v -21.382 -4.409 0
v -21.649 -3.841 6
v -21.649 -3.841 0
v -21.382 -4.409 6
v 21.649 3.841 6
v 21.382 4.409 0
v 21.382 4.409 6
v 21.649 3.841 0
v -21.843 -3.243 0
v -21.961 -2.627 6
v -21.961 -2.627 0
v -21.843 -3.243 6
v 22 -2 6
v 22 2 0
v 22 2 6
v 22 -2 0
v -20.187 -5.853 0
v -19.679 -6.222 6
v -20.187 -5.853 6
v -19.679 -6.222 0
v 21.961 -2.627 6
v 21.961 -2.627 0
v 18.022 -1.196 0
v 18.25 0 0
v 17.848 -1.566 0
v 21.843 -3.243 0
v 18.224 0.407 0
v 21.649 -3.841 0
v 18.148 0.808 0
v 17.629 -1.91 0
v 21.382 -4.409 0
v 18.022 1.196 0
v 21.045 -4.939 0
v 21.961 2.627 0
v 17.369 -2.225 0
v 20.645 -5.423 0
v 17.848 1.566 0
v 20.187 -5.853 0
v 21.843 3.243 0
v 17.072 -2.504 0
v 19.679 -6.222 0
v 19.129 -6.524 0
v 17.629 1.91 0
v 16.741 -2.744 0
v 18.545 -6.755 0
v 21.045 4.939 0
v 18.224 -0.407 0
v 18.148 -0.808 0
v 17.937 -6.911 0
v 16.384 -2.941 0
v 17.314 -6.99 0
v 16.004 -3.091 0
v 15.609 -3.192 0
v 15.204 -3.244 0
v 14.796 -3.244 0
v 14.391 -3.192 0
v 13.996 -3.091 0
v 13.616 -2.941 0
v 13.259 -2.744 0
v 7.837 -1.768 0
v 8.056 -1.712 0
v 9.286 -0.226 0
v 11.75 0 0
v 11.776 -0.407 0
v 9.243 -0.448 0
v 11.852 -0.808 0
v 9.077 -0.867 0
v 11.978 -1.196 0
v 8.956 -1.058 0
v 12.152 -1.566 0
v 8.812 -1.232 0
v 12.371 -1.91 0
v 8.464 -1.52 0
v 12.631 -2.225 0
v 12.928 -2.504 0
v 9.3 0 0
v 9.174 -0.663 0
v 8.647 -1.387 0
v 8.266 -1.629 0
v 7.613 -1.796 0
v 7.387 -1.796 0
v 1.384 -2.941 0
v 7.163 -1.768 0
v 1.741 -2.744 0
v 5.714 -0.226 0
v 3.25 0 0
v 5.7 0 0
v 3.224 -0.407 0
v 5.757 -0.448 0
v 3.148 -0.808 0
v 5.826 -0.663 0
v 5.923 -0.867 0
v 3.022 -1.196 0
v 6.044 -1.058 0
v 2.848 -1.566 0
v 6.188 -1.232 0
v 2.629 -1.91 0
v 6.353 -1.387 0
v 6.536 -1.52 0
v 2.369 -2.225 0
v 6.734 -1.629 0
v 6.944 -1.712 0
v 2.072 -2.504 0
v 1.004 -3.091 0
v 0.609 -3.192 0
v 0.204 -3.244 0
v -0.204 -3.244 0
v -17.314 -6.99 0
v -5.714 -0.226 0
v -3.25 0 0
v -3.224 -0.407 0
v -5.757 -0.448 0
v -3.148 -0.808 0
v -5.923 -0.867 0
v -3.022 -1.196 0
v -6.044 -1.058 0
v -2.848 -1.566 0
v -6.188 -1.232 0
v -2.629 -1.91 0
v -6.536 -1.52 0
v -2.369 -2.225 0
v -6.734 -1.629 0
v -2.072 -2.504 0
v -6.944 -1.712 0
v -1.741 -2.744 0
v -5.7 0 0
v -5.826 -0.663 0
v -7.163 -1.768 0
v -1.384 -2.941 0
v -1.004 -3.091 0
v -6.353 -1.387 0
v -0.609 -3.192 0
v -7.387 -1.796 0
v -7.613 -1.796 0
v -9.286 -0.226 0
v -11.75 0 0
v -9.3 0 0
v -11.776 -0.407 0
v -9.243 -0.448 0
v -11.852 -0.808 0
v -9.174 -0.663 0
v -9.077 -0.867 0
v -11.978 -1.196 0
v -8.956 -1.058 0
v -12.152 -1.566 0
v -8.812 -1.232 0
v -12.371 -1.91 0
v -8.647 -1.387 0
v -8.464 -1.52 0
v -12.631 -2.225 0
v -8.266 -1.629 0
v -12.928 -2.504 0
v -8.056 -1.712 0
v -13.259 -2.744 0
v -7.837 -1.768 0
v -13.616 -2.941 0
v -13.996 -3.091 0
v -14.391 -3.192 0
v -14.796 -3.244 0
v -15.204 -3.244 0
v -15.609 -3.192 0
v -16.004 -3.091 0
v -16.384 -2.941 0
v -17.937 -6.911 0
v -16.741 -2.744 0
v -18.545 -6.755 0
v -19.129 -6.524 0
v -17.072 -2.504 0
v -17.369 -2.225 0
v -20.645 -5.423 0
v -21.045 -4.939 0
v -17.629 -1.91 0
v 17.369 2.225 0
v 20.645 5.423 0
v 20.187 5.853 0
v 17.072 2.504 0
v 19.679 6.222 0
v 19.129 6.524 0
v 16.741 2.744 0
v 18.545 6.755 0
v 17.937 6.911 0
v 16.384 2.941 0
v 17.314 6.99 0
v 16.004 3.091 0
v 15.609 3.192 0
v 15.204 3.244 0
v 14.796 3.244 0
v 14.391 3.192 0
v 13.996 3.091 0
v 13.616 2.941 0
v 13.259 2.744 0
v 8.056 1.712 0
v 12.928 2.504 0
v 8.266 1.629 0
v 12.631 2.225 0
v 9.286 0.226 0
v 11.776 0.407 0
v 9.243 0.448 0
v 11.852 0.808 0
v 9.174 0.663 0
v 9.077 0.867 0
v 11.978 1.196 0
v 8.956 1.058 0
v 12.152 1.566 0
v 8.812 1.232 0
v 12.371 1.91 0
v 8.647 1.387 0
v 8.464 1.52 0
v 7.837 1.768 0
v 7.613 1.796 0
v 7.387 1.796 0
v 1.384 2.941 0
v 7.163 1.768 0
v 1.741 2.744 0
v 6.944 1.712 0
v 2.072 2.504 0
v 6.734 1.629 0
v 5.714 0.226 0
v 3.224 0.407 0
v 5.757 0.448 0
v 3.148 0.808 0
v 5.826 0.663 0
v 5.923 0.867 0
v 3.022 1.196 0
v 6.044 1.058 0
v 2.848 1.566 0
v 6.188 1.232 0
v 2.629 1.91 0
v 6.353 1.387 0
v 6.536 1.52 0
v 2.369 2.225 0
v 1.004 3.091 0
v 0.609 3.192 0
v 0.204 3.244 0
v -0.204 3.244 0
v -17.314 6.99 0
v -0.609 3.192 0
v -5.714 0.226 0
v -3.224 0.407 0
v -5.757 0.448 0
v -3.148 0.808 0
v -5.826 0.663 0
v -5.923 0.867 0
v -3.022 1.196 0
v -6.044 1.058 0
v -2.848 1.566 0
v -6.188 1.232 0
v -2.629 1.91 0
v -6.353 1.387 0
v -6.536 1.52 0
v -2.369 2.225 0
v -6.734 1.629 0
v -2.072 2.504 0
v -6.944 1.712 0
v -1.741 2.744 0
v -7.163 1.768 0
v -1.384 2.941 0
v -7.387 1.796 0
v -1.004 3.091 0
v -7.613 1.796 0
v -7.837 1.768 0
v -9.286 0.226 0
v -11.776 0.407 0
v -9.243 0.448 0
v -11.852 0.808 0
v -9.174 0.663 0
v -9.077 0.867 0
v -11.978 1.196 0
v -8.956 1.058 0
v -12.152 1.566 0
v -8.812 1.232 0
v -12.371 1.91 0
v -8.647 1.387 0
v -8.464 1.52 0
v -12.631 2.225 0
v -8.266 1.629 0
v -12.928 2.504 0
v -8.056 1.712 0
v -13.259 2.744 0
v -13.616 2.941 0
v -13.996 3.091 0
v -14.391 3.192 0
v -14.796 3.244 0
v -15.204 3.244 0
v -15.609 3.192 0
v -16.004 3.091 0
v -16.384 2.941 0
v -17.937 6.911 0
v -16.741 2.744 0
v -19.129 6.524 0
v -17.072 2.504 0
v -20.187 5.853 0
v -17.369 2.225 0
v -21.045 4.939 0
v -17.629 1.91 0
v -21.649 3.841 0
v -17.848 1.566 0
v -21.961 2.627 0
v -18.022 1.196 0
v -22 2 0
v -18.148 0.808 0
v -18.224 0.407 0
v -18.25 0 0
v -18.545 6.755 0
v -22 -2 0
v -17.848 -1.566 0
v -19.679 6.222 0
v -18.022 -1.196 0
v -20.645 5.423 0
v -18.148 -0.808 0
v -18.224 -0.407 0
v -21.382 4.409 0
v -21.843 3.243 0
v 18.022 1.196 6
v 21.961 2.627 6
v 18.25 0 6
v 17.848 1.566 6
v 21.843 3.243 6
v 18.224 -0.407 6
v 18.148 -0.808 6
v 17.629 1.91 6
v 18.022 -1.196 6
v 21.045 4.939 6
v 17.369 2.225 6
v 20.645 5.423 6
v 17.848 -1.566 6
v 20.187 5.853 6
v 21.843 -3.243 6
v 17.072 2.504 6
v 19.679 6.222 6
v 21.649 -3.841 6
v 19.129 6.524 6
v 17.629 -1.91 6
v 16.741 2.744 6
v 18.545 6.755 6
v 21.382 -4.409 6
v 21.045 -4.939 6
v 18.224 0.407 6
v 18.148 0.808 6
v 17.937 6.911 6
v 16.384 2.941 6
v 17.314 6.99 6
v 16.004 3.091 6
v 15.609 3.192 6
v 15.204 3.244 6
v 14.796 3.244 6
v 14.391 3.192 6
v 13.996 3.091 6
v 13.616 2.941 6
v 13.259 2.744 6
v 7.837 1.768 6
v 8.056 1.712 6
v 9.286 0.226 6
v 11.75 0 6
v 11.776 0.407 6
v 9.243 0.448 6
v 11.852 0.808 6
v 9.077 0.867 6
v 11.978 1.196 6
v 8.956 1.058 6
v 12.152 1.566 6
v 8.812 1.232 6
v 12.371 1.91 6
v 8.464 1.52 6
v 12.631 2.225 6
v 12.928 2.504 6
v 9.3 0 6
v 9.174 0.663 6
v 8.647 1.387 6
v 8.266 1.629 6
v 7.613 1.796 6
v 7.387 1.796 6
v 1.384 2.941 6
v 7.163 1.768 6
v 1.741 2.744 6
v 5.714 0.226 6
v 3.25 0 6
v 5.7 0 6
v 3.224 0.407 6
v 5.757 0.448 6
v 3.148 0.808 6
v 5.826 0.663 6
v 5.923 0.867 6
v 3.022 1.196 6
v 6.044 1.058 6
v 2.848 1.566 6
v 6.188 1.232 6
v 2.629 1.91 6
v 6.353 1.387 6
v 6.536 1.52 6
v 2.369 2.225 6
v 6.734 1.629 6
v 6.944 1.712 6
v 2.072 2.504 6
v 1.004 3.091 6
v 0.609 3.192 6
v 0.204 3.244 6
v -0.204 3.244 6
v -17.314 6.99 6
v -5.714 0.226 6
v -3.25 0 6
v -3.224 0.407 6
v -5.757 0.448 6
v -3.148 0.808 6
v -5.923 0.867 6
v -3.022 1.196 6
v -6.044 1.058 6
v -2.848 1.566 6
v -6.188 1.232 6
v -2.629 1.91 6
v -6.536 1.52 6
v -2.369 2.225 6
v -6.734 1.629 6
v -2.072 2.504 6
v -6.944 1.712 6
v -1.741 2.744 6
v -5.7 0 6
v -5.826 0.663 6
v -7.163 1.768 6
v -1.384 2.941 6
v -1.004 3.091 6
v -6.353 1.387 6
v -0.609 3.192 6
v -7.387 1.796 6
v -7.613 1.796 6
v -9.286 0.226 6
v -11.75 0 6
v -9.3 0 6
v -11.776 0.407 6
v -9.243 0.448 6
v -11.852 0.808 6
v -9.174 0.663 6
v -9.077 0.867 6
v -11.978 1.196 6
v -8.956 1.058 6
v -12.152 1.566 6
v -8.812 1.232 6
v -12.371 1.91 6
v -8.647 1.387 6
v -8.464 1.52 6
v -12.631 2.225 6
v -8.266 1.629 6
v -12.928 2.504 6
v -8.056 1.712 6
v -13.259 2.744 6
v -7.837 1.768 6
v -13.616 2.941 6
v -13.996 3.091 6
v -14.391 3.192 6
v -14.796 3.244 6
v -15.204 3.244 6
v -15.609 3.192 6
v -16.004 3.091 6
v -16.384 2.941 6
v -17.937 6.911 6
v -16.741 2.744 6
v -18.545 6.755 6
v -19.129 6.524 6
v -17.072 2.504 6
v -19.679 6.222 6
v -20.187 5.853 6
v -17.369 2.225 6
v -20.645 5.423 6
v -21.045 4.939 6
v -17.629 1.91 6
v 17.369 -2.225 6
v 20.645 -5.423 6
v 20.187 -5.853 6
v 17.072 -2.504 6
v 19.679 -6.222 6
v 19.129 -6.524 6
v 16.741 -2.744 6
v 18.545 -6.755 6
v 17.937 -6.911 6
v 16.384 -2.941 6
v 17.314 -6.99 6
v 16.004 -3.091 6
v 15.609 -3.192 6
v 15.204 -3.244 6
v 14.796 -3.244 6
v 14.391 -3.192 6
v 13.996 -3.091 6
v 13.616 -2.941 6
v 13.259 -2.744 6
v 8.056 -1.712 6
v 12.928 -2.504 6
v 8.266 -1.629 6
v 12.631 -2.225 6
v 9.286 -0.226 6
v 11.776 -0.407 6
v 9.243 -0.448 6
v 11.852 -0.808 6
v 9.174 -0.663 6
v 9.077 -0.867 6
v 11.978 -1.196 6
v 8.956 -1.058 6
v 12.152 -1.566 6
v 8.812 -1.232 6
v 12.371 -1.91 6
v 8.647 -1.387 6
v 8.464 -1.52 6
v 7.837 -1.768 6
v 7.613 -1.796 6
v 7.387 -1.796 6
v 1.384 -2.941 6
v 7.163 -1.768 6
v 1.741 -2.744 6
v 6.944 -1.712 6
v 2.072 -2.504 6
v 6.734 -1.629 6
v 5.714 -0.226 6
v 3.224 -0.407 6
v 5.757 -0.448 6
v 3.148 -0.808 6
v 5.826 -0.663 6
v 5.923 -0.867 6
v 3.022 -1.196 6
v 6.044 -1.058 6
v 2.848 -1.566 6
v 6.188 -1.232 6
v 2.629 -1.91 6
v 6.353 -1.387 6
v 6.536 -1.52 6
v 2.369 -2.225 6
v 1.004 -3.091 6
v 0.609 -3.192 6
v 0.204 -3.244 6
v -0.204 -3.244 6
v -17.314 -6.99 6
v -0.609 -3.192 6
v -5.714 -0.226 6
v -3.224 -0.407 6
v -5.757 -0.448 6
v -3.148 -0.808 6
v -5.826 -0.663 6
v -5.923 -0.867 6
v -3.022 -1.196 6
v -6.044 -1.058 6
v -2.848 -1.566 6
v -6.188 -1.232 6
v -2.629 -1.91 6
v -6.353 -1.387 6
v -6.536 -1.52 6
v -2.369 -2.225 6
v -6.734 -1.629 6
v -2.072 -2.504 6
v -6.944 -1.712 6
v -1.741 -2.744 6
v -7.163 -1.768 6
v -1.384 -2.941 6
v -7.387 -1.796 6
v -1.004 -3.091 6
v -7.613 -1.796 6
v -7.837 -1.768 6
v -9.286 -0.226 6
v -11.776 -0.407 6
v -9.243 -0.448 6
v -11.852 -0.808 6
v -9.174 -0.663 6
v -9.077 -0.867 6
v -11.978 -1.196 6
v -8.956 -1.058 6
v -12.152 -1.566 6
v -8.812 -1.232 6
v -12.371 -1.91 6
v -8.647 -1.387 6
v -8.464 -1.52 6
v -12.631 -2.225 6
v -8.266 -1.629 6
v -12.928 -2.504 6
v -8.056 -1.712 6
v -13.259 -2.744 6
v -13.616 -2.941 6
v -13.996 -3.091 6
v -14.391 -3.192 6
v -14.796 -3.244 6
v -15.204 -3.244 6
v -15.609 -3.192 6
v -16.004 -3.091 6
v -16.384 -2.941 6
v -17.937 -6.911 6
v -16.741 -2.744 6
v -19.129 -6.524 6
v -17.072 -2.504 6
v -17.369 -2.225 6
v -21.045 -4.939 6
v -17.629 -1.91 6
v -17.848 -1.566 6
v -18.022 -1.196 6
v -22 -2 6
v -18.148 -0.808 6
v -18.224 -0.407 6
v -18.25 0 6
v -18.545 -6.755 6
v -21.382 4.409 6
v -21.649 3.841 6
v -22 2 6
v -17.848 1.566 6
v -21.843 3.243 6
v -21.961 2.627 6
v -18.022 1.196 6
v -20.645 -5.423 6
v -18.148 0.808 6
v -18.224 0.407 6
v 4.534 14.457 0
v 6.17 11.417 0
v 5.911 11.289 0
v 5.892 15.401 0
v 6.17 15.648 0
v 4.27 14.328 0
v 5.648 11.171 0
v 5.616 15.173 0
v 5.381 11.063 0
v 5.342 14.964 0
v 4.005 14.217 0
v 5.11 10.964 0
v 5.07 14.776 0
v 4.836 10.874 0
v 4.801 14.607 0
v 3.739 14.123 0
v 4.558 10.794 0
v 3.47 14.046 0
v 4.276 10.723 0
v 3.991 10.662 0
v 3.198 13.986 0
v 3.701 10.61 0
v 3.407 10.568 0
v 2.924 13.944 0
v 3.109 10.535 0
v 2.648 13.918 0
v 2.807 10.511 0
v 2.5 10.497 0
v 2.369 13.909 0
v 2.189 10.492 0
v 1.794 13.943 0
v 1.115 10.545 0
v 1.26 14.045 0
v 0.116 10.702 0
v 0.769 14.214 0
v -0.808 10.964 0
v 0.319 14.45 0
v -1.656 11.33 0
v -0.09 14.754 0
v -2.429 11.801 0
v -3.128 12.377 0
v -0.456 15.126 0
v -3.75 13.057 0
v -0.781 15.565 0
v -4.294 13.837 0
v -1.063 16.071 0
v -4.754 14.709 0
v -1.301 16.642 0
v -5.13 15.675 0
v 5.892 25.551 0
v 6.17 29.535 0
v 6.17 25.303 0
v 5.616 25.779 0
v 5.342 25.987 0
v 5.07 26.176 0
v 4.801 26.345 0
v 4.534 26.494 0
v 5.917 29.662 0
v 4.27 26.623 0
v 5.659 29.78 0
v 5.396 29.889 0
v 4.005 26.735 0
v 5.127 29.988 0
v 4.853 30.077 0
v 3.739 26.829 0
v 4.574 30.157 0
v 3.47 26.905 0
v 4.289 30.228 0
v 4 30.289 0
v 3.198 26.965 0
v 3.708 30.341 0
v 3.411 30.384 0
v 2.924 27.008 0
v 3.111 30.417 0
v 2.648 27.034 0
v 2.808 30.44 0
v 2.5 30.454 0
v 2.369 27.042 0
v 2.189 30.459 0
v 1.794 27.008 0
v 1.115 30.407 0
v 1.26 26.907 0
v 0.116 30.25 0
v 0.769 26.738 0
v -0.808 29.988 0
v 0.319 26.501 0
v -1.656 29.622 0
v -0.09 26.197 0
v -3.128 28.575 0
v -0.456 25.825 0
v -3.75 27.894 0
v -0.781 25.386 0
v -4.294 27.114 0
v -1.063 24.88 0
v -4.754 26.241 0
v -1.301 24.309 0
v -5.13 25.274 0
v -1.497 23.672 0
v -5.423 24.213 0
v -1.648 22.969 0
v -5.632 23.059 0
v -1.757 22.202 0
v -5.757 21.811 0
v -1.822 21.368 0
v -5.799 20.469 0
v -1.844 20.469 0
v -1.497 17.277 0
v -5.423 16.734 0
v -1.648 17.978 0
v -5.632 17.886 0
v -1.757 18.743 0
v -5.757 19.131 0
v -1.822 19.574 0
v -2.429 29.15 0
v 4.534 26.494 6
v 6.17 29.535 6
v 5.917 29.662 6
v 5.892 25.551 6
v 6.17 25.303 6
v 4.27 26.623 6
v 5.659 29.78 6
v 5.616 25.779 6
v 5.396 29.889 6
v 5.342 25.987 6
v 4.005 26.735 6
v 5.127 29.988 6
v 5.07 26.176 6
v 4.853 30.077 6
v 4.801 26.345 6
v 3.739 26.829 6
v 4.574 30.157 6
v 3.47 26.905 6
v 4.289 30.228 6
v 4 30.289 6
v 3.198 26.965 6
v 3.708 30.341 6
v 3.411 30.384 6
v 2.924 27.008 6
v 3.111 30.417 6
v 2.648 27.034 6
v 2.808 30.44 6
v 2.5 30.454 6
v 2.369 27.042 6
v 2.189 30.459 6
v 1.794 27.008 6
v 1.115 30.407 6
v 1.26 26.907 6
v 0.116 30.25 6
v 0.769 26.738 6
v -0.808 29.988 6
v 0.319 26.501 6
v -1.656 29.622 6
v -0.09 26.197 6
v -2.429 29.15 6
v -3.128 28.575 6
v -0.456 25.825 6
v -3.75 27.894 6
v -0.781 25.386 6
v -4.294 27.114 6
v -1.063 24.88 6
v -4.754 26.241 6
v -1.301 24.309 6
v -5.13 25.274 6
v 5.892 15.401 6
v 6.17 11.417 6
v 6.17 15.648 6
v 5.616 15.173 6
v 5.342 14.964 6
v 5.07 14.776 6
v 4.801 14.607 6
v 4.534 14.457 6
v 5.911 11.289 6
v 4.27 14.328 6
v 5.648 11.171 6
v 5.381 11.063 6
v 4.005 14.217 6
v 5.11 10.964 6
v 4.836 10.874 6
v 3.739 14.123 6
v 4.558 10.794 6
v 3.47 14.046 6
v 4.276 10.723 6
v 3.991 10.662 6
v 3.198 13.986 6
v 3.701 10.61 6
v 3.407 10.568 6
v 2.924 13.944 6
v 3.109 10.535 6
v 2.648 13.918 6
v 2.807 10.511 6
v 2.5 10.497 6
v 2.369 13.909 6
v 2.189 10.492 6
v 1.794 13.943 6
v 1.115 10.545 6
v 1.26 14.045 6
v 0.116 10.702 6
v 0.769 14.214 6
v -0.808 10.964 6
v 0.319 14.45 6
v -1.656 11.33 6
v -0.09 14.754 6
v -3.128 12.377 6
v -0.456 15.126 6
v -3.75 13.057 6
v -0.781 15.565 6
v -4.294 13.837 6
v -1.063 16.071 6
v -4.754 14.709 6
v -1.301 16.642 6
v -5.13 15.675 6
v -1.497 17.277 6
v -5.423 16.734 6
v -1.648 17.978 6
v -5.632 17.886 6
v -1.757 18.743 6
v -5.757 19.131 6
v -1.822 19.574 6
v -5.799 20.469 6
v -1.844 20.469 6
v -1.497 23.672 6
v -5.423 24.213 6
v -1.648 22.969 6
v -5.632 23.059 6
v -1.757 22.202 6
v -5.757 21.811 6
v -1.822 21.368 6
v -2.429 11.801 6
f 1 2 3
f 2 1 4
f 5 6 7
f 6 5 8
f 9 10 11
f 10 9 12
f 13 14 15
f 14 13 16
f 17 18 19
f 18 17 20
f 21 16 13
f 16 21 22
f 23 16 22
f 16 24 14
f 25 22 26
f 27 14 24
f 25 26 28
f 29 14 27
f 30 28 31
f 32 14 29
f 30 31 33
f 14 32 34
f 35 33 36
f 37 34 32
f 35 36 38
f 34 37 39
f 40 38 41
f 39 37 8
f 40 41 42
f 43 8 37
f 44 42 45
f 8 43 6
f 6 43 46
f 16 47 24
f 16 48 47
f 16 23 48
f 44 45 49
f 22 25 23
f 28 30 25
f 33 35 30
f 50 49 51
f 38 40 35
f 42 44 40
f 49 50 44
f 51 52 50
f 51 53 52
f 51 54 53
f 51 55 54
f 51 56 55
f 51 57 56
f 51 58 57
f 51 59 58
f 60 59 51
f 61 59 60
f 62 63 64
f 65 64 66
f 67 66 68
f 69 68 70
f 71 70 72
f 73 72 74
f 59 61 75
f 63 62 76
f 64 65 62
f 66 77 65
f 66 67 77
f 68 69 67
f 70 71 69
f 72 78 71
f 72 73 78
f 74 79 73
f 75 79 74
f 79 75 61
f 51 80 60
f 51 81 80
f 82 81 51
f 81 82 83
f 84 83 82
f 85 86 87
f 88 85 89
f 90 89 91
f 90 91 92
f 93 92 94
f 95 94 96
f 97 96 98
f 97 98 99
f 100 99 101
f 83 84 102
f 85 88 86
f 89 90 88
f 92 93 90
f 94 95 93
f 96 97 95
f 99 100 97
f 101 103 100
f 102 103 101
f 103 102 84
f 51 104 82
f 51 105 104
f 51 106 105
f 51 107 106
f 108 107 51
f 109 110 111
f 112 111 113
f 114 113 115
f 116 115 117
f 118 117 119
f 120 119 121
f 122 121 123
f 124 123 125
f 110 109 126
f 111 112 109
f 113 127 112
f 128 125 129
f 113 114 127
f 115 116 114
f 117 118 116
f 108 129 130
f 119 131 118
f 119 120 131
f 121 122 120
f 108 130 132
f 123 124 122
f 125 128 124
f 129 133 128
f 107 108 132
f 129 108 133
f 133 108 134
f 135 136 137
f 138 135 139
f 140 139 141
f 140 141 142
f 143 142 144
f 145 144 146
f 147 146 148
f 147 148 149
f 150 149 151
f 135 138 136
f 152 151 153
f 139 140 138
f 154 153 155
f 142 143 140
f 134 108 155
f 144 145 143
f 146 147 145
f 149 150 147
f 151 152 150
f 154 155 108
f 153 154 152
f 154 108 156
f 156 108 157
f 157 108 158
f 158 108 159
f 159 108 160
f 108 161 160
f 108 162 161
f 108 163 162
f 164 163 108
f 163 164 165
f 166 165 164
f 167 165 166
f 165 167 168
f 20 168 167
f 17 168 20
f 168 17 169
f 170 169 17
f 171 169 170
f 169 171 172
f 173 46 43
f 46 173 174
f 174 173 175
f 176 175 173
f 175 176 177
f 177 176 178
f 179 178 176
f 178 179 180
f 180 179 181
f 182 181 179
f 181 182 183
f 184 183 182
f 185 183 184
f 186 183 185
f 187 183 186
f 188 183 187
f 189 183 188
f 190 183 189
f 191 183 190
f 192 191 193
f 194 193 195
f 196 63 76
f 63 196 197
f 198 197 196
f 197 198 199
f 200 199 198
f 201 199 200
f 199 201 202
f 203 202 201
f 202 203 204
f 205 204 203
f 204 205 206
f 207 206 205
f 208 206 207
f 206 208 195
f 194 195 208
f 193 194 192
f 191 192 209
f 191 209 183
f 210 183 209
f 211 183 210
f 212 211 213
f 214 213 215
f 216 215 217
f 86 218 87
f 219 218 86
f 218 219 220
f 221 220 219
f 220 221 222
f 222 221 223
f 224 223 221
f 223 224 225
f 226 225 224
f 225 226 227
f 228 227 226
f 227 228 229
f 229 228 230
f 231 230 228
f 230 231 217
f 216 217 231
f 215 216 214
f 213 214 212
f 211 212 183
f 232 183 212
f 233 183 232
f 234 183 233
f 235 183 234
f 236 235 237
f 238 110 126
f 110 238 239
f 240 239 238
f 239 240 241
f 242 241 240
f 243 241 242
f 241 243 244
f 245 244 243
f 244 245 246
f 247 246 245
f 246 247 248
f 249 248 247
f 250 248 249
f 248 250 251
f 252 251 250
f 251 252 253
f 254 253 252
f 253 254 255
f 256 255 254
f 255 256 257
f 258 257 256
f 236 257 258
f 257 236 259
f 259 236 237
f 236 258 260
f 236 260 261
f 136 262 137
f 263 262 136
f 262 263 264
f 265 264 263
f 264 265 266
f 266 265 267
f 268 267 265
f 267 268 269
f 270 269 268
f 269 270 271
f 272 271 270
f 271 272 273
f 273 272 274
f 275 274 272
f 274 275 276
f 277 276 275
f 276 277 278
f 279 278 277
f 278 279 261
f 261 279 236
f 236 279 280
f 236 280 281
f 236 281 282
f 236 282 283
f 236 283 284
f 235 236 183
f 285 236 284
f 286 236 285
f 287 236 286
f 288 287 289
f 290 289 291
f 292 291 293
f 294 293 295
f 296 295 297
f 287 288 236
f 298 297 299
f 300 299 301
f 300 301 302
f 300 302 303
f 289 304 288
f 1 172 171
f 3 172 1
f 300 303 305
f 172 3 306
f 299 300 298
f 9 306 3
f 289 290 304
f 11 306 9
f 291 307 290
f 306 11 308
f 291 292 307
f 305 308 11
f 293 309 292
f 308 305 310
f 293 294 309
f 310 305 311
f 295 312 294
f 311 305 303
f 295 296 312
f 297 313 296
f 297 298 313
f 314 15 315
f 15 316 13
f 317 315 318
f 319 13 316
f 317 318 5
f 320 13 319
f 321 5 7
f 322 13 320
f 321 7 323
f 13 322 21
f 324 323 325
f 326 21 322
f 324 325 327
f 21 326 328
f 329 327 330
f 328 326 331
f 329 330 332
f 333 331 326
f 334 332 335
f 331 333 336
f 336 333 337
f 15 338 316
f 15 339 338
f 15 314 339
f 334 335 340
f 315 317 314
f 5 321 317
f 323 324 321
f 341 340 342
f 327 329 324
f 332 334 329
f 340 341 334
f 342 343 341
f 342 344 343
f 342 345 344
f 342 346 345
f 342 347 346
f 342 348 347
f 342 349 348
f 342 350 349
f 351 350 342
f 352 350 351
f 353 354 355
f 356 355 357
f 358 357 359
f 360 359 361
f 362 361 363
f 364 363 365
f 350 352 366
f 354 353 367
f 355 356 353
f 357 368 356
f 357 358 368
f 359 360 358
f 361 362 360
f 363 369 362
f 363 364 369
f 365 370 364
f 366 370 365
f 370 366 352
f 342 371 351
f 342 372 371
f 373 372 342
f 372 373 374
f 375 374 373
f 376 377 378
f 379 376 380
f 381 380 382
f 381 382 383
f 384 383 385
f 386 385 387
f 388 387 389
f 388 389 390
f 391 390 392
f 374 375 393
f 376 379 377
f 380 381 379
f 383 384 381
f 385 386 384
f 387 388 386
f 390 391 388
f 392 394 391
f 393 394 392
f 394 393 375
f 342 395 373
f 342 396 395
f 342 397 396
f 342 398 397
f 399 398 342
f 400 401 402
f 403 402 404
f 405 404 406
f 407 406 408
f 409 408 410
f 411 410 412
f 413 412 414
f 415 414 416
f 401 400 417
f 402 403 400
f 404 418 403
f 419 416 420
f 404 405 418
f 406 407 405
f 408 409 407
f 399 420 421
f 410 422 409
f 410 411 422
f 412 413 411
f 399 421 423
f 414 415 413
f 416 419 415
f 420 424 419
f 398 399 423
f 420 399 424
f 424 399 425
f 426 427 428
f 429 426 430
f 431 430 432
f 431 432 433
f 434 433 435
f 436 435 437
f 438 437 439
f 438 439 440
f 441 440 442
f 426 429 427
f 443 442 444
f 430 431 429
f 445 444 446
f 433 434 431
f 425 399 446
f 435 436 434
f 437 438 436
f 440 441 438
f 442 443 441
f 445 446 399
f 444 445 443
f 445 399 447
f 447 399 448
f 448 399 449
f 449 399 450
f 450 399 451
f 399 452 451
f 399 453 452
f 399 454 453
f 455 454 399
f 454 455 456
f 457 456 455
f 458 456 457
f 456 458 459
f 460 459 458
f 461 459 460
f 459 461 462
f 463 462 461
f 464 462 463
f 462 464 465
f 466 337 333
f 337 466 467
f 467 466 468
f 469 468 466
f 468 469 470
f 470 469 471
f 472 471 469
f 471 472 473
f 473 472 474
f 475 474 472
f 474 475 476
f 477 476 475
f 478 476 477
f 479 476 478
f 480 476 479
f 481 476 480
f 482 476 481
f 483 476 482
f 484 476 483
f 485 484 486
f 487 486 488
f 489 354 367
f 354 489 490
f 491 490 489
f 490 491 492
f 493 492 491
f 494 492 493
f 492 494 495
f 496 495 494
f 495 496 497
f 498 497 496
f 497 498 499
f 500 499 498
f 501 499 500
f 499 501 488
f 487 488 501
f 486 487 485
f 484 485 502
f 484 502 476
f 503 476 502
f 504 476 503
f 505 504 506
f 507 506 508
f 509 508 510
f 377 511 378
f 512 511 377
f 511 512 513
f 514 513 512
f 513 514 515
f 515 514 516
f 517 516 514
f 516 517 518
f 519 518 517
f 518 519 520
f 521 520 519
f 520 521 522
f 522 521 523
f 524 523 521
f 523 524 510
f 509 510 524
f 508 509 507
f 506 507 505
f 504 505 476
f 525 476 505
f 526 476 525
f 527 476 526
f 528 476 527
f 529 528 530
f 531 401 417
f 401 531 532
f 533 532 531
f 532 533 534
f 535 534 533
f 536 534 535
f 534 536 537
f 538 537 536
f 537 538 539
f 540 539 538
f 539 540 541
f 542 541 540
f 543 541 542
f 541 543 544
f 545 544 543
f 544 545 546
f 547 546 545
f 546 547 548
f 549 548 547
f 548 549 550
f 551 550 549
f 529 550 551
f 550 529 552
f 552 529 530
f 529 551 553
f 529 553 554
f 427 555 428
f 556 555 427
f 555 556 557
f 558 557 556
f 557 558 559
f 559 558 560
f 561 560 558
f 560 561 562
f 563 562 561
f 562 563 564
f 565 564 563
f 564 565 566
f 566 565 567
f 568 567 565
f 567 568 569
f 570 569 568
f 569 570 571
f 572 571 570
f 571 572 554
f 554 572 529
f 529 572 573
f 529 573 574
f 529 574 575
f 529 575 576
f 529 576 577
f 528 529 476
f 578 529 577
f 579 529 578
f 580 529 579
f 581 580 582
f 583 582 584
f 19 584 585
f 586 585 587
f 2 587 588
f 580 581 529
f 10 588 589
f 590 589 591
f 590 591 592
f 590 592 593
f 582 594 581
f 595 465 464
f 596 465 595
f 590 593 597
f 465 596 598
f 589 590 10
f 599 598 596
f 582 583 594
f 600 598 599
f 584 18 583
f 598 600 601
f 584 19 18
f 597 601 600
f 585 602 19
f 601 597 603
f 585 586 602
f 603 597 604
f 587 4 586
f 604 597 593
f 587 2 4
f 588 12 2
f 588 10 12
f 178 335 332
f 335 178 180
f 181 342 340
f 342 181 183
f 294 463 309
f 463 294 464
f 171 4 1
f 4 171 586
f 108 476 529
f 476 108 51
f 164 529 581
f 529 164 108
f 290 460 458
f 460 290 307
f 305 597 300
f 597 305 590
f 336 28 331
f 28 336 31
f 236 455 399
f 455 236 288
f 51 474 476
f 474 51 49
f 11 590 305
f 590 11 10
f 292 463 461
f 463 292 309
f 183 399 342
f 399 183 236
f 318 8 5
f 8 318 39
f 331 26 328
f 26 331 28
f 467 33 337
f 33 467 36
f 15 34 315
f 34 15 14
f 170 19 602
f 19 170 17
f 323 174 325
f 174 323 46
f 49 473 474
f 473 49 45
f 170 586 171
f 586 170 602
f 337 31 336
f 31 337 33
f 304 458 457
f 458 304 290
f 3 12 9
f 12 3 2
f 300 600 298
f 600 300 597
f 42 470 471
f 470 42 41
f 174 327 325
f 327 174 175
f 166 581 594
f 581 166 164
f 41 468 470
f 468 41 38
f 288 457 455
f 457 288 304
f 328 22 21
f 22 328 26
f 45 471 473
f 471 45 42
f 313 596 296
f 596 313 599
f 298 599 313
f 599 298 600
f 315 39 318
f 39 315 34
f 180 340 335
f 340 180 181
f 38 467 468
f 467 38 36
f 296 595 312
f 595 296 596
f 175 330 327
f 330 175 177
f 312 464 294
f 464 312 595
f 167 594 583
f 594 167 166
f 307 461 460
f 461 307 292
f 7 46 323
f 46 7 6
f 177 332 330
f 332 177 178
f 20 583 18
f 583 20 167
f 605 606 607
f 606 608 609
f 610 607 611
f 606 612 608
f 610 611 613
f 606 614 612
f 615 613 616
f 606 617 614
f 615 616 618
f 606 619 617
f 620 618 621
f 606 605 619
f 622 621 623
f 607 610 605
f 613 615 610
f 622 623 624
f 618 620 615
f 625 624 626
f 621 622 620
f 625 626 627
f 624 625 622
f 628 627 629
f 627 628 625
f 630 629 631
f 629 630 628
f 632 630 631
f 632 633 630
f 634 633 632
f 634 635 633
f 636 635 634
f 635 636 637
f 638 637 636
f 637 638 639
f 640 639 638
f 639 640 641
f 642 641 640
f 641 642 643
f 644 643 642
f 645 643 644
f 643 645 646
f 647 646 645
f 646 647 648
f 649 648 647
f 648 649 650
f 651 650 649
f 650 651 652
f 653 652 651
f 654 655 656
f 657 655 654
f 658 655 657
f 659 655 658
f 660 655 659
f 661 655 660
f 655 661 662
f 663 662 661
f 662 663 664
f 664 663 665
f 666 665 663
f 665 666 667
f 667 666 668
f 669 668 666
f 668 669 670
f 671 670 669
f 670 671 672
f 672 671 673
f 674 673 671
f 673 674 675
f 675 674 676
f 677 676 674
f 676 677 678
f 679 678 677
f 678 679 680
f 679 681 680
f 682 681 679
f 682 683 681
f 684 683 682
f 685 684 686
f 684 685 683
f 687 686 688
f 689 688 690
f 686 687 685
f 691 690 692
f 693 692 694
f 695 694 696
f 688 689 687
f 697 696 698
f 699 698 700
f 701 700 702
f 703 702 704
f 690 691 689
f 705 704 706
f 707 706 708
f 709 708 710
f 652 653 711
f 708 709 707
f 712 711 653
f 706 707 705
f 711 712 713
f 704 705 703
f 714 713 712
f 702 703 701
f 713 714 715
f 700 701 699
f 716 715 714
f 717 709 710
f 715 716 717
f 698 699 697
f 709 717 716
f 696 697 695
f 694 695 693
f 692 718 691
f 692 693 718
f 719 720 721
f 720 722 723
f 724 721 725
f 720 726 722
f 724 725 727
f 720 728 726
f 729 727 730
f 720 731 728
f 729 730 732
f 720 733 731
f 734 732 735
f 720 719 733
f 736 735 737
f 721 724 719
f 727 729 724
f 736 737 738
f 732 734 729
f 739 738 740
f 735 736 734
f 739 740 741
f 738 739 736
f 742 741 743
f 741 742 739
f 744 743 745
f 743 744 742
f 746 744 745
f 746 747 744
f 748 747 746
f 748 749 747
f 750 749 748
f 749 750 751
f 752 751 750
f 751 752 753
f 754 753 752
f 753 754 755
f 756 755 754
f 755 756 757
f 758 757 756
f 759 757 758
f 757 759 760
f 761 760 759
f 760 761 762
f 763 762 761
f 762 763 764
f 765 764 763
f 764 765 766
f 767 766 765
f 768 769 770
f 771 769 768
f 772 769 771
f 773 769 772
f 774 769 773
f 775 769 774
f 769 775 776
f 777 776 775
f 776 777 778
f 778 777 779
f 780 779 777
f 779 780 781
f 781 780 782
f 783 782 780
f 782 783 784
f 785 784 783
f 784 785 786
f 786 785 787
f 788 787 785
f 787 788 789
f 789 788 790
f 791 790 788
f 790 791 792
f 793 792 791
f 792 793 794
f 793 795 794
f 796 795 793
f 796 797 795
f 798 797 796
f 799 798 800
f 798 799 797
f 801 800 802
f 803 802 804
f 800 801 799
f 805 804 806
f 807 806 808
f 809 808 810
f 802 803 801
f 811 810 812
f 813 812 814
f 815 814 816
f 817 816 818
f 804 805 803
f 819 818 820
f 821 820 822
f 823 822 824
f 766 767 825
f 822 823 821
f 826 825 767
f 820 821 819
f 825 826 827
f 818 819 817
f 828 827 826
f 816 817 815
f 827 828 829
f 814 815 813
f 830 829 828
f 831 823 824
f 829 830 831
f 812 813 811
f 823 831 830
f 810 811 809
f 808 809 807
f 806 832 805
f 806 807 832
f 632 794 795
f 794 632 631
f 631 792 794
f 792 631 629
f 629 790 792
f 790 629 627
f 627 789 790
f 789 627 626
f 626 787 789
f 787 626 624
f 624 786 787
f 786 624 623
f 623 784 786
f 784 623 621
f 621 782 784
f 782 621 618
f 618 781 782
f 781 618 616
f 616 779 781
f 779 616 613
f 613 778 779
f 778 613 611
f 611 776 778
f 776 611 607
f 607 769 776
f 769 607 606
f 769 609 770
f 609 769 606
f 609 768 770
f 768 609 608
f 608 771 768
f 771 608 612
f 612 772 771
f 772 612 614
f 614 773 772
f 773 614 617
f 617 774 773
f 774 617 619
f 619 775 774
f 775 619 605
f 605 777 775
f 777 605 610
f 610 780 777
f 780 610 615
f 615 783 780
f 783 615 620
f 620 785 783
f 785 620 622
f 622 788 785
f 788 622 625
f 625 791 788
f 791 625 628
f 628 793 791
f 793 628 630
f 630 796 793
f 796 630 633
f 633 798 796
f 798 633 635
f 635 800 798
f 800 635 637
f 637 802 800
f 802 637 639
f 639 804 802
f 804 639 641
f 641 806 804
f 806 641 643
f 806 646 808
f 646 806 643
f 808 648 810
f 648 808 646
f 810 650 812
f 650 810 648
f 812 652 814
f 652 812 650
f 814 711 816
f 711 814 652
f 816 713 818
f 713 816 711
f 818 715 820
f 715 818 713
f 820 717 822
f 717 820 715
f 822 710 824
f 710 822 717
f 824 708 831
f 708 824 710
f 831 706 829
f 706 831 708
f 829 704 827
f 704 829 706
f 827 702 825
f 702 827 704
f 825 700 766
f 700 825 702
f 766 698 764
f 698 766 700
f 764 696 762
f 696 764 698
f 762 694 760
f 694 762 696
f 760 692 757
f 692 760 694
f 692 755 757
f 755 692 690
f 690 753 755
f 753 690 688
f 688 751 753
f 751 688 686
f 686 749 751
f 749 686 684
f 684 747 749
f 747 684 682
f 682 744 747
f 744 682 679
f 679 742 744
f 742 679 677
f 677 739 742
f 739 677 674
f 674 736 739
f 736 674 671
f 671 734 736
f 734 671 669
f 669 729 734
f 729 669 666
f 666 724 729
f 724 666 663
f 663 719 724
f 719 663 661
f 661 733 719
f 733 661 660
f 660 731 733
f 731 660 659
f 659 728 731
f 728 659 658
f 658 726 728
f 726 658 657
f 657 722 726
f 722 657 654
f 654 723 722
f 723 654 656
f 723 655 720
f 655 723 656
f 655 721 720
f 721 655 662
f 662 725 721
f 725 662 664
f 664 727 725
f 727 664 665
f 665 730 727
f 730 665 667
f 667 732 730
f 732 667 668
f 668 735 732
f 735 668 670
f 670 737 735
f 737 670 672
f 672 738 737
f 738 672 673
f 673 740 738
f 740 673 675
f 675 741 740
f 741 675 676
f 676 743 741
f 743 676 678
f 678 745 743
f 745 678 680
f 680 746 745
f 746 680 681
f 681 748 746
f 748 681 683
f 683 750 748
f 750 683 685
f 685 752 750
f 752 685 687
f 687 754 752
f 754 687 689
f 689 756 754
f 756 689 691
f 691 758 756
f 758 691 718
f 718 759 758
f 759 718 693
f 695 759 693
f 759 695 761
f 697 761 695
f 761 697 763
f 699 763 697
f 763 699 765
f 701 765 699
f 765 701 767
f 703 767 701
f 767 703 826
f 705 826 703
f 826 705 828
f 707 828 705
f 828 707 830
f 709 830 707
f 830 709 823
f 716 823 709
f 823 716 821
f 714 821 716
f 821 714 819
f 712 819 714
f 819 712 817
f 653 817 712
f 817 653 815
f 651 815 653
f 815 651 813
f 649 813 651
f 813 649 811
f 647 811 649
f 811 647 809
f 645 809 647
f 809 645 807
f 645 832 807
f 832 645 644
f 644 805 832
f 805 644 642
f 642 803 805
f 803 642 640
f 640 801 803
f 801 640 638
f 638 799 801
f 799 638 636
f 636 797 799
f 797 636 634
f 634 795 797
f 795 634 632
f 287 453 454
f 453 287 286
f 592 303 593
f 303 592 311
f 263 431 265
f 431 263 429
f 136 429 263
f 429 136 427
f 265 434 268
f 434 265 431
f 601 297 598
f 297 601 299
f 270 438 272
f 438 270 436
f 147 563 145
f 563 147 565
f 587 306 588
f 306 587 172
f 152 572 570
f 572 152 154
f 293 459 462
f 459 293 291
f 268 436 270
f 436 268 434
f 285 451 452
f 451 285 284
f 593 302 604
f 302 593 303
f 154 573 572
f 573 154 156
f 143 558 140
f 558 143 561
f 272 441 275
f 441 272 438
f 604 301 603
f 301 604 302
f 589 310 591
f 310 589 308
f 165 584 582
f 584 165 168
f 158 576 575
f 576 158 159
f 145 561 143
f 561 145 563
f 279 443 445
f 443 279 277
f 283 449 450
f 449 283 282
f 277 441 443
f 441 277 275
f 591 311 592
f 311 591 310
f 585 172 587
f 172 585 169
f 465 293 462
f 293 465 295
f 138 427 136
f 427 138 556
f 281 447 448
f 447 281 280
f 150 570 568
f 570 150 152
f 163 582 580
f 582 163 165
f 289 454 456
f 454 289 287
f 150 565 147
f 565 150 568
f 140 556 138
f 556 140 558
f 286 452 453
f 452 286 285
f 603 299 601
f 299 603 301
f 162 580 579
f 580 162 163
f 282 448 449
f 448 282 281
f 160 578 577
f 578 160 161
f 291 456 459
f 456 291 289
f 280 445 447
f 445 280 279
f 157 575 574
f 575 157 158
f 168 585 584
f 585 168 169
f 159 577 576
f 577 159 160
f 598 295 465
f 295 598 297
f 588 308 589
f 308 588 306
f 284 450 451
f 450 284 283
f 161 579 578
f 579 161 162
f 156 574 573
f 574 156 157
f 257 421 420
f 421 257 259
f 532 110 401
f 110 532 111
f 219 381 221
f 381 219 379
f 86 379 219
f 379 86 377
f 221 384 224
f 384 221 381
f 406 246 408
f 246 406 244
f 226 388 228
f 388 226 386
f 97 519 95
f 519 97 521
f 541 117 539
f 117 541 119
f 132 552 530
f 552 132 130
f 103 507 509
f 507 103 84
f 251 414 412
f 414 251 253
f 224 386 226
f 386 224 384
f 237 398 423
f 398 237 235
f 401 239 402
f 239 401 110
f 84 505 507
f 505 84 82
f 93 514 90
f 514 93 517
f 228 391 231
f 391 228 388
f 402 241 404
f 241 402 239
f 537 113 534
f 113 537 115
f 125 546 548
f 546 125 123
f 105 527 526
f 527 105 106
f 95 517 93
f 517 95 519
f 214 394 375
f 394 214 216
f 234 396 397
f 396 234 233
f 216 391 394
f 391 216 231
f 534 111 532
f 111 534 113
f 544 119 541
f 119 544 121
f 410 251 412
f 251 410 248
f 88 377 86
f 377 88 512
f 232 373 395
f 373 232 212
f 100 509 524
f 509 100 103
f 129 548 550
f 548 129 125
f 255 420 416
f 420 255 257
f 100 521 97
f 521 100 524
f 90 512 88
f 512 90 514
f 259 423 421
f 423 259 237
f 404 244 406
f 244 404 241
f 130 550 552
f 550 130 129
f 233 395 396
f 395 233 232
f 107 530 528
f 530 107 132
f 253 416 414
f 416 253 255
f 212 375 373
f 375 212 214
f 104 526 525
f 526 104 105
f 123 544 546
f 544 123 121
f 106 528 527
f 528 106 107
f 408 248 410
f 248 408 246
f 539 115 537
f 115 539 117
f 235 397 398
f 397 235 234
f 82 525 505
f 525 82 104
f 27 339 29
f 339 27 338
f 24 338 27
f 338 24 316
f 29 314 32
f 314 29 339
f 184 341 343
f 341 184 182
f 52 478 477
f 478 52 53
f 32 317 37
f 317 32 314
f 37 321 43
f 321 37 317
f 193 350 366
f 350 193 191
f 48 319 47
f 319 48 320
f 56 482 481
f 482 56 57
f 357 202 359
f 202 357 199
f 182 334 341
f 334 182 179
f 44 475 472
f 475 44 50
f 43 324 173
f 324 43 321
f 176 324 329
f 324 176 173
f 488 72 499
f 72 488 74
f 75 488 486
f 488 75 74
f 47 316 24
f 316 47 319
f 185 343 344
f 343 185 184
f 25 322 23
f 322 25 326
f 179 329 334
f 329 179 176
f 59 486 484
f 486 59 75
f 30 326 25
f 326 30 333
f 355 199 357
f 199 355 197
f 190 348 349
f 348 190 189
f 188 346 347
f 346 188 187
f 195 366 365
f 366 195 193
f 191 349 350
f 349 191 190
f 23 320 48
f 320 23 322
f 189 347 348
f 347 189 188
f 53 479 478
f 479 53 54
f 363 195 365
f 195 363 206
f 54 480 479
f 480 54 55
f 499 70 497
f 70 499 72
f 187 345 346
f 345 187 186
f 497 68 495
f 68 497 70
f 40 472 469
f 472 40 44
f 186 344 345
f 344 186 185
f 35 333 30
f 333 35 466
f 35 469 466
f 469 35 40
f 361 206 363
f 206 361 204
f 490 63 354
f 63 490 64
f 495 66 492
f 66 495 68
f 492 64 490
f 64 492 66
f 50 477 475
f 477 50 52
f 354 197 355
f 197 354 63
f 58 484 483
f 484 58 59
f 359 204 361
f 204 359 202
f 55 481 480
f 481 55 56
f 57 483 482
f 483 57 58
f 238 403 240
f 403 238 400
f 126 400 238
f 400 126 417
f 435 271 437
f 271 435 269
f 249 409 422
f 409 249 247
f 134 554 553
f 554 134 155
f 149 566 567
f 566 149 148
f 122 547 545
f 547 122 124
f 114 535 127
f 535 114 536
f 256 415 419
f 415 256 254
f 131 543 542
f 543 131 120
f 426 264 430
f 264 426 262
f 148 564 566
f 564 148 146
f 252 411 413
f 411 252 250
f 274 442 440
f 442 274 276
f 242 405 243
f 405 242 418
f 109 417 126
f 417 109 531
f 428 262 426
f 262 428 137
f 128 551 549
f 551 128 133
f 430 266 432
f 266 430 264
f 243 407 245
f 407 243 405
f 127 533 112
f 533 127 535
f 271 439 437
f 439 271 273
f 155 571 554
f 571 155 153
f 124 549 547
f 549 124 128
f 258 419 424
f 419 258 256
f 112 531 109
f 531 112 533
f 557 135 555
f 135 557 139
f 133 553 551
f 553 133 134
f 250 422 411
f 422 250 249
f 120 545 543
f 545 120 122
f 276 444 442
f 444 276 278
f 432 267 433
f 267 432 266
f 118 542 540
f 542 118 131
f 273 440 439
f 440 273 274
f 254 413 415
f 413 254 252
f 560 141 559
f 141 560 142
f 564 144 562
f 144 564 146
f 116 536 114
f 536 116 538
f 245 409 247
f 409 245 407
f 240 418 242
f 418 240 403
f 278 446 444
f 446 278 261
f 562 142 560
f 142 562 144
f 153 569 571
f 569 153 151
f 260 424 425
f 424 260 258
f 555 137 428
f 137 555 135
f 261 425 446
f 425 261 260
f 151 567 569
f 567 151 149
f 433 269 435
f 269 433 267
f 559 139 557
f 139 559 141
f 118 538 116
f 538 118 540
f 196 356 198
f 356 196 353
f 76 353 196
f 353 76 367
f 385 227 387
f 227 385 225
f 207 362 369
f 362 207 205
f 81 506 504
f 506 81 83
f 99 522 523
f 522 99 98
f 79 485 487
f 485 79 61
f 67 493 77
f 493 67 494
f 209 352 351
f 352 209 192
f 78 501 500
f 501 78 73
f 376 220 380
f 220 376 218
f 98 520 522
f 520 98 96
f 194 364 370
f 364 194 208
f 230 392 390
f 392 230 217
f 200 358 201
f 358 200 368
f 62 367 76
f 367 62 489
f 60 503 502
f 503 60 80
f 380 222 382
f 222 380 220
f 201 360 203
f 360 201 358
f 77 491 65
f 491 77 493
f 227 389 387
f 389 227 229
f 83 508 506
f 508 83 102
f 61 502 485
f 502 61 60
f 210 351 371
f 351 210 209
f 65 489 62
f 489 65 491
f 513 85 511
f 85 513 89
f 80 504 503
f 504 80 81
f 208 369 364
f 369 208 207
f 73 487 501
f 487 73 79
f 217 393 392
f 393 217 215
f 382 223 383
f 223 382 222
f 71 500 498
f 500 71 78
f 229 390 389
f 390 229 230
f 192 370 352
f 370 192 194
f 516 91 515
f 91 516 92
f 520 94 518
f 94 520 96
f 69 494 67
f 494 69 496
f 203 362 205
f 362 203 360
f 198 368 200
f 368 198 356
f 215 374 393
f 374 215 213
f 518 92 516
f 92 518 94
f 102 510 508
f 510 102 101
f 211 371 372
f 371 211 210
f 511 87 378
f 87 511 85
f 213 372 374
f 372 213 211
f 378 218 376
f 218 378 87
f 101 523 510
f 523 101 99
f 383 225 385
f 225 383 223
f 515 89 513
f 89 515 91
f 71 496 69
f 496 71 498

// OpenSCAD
$fn = 50;


difference() {
	union() {
		hull() {
			translate(v = [-17.0000000000, 2.0000000000, 0]) {
				cylinder(h = 6, r = 5);
			}
			translate(v = [17.0000000000, 2.0000000000, 0]) {
				cylinder(h = 6, r = 5);
			}
			translate(v = [-17.0000000000, -2.0000000000, 0]) {
				cylinder(h = 6, r = 5);
			}
			translate(v = [17.0000000000, -2.0000000000, 0]) {
				cylinder(h = 6, r = 5);
			}
		}
		translate(v = [0, 30.0000000000, 0]) {
			linear_extrude(height = 6) {
				text(font = "DejaVu Sans Mono:style=Bold", halign = "center", size = 19.0000000000, text = "C", valign = "top");
			}
		}
	}
	union() {
		translate(v = [-15.0000000000, 0.0000000000, 0]) {
			translate(v = [0, 0, -100]) {
				cylinder(h = 200, r = 3.2500000000);
			}
		}
		translate(v = [0, 0, -100]) {
			cylinder(h = 200, r = 3.2500000000);
		}
		translate(v = [15.0000000000, 0.0000000000, 0]) {
			translate(v = [0, 0, -100]) {
				cylinder(h = 200, r = 3.2500000000);
			}
		}
		translate(v = [-15.0000000000, 0.0000000000, 0]) {
			translate(v = [0, 0, -100]) {
				cylinder(h = 200, r = 1.8000000000);
			}
		}
		translate(v = [-7.5000000000, 0.0000000000, 0]) {
			translate(v = [0, 0, -100]) {
				cylinder(h = 200, r = 1.8000000000);
			}
		}
		translate(v = [0, 0, -100]) {
			cylinder(h = 200, r = 1.8000000000);
		}
		translate(v = [7.5000000000, 0.0000000000, 0]) {
			translate(v = [0, 0, -100]) {
				cylinder(h = 200, r = 1.8000000000);
			}
		}
		translate(v = [15.0000000000, 0.0000000000, 0]) {
			translate(v = [0, 0, -100]) {
				cylinder(h = 200, r = 1.8000000000);
			}
		}
	}
}
